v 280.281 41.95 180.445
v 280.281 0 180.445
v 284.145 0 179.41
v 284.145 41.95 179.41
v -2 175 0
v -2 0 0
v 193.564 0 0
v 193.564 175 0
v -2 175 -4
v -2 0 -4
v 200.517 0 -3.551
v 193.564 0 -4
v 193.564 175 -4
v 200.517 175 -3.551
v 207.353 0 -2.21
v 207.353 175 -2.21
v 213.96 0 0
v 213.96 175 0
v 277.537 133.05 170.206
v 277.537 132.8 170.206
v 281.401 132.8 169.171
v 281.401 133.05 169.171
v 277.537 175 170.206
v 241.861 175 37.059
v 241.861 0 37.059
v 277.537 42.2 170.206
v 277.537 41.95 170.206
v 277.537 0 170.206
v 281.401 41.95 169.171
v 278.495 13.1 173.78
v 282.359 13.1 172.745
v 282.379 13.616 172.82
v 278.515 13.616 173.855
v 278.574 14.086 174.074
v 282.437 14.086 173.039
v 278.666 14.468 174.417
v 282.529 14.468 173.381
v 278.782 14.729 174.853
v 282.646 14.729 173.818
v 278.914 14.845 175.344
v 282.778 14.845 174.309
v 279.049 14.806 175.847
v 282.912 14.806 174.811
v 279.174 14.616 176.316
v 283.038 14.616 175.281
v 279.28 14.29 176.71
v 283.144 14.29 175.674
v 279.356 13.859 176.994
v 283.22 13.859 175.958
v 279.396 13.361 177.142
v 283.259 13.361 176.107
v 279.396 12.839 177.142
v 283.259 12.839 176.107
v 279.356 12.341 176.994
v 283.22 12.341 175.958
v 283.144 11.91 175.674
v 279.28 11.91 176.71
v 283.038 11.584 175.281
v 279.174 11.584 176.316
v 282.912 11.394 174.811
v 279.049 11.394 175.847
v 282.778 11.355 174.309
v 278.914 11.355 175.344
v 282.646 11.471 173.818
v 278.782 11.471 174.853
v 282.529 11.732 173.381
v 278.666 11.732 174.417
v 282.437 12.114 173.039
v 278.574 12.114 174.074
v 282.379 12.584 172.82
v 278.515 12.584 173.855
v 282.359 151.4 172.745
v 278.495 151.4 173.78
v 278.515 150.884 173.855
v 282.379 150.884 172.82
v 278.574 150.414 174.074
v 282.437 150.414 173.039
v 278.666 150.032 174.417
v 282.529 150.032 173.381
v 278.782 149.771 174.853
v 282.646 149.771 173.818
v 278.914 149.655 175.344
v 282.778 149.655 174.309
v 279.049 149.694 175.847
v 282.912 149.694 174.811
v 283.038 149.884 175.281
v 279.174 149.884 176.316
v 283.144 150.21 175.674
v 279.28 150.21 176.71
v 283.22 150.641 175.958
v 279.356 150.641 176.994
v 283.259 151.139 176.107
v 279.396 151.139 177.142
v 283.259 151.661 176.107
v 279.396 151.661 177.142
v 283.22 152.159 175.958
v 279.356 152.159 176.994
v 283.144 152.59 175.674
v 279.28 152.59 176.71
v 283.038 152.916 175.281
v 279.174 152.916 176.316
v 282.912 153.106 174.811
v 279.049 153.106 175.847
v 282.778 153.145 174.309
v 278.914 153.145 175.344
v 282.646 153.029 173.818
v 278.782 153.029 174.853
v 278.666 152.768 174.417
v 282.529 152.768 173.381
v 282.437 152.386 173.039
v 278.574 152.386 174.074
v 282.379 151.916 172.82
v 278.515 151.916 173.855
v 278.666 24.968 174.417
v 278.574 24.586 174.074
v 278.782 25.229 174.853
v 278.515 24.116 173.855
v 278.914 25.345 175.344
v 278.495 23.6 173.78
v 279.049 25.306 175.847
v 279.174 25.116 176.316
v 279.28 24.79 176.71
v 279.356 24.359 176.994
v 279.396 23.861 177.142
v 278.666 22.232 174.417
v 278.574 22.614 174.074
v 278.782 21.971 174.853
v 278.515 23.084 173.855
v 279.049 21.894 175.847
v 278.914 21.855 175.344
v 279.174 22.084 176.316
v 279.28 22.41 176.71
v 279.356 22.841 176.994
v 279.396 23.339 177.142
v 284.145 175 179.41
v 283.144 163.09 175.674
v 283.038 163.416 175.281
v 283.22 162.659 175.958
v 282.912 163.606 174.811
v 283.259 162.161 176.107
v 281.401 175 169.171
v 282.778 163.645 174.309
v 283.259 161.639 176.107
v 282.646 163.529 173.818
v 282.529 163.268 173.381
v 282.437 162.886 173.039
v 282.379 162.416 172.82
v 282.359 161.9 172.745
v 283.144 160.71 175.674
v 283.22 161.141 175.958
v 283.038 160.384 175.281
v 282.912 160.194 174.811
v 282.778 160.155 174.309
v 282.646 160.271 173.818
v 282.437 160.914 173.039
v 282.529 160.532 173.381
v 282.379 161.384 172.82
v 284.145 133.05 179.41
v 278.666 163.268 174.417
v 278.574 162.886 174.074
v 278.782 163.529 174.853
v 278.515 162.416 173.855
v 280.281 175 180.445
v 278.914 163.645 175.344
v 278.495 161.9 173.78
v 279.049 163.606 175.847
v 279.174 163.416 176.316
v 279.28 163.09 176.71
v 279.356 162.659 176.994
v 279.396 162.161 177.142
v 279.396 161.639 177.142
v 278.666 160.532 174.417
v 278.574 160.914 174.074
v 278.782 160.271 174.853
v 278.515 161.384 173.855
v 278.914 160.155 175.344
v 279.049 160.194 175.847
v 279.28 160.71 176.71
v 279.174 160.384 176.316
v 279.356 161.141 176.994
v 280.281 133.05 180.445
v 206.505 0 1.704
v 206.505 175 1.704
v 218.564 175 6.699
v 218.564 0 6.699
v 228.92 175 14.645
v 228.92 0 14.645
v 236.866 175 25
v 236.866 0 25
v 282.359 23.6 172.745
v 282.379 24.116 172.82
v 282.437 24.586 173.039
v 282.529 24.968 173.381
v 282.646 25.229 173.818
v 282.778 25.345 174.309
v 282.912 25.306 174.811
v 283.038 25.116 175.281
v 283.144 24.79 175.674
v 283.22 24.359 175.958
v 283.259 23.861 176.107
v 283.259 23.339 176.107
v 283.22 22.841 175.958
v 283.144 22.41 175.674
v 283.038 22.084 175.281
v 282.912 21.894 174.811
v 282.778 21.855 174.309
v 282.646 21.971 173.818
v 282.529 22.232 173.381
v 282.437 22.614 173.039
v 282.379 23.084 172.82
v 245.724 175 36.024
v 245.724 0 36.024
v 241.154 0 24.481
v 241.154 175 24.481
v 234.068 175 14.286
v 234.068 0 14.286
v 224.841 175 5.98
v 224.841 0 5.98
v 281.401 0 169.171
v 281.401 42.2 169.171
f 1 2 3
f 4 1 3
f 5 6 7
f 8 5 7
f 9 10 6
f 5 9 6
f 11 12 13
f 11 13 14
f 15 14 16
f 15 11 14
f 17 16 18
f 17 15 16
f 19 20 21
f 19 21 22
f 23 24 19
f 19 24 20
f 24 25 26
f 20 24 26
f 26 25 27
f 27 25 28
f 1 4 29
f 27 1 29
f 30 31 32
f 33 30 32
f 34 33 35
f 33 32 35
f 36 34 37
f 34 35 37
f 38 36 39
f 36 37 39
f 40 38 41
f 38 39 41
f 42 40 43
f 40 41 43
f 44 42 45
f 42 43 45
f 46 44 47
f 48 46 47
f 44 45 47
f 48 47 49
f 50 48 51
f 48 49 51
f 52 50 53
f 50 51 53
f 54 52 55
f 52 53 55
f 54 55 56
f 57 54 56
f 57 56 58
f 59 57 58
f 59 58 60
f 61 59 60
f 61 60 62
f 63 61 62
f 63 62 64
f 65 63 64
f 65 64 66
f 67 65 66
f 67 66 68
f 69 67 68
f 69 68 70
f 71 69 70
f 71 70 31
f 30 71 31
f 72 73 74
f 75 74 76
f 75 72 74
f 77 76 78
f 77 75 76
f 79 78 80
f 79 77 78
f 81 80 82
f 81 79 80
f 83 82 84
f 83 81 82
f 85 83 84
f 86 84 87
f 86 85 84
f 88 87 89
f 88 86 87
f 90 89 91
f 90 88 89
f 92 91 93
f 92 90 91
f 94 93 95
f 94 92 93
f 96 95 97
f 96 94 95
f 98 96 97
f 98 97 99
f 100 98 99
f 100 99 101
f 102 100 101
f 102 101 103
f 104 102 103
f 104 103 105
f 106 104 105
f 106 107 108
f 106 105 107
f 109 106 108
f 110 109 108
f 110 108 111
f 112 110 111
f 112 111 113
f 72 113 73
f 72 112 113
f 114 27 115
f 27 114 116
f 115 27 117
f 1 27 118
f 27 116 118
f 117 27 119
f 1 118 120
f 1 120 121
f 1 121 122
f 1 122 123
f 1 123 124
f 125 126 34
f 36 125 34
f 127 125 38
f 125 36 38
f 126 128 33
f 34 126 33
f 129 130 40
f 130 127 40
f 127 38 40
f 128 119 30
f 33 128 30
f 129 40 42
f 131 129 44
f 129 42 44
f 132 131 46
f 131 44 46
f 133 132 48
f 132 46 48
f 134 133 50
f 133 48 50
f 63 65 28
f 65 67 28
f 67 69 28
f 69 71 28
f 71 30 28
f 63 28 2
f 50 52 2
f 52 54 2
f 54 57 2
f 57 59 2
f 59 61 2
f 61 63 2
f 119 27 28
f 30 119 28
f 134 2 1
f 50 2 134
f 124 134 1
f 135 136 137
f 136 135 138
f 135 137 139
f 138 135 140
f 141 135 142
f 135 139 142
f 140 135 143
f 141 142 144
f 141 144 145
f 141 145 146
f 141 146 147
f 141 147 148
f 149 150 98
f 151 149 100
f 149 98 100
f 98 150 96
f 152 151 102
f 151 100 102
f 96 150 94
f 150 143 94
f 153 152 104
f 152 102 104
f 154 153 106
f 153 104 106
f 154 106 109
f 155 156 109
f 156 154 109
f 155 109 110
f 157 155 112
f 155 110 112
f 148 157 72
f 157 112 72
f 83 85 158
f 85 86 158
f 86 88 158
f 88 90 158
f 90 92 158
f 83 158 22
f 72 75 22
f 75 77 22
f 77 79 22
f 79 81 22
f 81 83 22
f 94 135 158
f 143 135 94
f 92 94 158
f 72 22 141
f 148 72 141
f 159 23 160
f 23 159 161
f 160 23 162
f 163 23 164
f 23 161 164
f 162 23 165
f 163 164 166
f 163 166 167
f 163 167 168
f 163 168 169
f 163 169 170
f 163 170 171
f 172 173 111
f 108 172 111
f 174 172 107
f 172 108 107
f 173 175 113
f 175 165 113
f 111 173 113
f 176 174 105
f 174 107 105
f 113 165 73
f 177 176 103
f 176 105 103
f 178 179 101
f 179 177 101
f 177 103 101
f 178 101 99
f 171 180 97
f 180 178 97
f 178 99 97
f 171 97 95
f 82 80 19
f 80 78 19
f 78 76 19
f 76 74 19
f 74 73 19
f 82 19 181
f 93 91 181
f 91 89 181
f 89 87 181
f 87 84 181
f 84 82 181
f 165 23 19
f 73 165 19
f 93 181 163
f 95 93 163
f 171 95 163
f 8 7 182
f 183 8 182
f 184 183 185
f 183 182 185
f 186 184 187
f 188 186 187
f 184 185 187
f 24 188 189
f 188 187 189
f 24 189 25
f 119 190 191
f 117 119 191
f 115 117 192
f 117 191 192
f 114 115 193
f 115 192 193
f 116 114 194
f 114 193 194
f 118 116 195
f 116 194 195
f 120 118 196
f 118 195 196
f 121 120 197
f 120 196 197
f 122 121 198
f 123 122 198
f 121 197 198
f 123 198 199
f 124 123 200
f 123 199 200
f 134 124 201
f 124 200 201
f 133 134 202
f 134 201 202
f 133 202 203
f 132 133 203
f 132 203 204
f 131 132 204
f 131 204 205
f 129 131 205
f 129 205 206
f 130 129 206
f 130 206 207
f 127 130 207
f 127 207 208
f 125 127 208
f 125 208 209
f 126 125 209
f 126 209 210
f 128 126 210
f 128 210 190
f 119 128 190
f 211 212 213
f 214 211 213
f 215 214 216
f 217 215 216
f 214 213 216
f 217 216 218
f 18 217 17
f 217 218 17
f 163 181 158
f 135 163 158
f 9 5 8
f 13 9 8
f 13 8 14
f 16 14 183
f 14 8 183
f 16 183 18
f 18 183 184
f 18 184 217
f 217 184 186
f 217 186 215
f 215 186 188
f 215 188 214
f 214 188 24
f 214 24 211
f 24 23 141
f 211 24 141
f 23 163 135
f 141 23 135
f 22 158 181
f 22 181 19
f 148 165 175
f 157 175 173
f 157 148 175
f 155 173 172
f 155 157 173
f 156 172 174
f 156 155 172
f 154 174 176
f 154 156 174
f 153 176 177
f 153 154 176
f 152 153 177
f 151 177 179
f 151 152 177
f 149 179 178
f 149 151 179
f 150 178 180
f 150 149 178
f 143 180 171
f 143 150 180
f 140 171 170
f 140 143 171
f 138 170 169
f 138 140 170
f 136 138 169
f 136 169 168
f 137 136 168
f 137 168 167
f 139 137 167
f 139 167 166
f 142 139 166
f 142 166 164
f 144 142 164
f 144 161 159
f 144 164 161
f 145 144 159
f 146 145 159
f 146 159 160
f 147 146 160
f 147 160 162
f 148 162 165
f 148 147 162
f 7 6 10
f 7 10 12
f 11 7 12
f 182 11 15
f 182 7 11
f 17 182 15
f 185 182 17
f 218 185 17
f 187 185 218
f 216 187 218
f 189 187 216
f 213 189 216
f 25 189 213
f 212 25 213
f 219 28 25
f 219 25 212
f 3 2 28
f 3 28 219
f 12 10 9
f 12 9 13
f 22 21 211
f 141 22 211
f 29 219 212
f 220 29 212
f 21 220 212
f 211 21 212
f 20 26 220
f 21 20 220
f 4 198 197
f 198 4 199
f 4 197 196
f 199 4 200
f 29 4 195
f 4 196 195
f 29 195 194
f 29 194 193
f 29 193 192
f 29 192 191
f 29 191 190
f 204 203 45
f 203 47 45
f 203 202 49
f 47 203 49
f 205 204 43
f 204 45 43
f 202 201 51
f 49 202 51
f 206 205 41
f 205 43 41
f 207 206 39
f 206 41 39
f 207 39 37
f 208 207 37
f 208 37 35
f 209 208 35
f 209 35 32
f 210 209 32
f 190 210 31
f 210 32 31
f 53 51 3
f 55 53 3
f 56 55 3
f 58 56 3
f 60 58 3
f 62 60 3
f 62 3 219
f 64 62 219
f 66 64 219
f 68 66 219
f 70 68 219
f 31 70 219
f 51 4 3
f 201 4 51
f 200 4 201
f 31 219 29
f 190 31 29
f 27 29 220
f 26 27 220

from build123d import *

# Parameters (mm, degrees)
ESBO_O1_W                = 425
ESBO_O1_H                = 175
FLANGE_BASE1_DEPTH       = 4
ESBO_O11_W               = 10.6
ESBO_O11_H               = 90.6
CORTE_EXTRUS_O2_DEPTH    = 155
DOBRA_ESBO_ADA1_DEPTH    = 175
DOBRA_ESBO_ADA1_2_DEPTH  = 175
DOBRA_ESBO_ADA1_3_DEPTH  = 42.2
DOBRA_START              = 132.8
DOBRA_ESBO_ADA1_4_DEPTH  = 42.2
ESBO_O14_R               = 1.75
CORTE_EXTRUS_O3_DEPTH    = 6
ESBO_O15_W               = 10.6
ESBO_O15_H               = 91.1
CORTE_EXTRUS_O4_DEPTH    = 44
ESBO_O16_W               = 2
ESBO_O16_H               = 4
RESSALTO_EXTRUS_O1_DEPTH = 175


# Read off the part's stored shape, not the designer's step: Dobra esboçada1
# Sheet-metal steps are written as plain solids
with BuildPart() as part:
    # Esboço1 → Flange-base1 (new body)
    with BuildSketch(Plane.XY):
        with Locations((212.5, 87.5)):
            Rectangle(ESBO_O1_W, ESBO_O1_H)
    extrude(amount=-FLANGE_BASE1_DEPTH)

    # Esboço11 → Corte-extrusão2 (cut)
    with BuildSketch(Plane(origin=(0, 0, -4), x_dir=(-1, 0, 0), z_dir=(0, 0, -1))):
        Polygon((-425, 175), (-425, 0), (-410.6, 0), (-410.6, 42.2), (-410.6, 132.8), (-410.6, 175), align=None)
        with Locations((-405.3, 87.5)):
            Rectangle(ESBO_O11_W, ESBO_O11_H)
    extrude(amount=-CORTE_EXTRUS_O2_DEPTH, mode=Mode.SUBTRACT)

    # Dobra esboçada1 outline → Dobra esboçada1 (cut)
    with BuildSketch(Plane(origin=(0, 0, 0), x_dir=(1, 0, 0), z_dir=(0, 1, 0))):
        with BuildLine():
            ThreePointArc((193.564342649, 4), (203.956647495, 2.990565198), (213.960420704, 0))
            Line((213.960420704, 0), (410.6, 0))
            Line((410.6, 0), (410.6, 4))
            Line((410.6, 4), (193.564342649, 4))
        make_face()
    extrude(amount=DOBRA_ESBO_ADA1_DEPTH, mode=Mode.SUBTRACT)

    # Dobra esbo_ada1 2 outline → Dobra esbo_ada1 2 (add)
    with BuildSketch(Plane(origin=(0, 0, 0), x_dir=(1, 0, 0), z_dir=(0, 1, 0))):
        with BuildLine():
            Line((277.537342774, -170.206337672), (281.401046079, -169.171061491))
            Line((281.401046079, -169.171061491), (245.724337269, -36.023771564))
            ThreePointArc((245.724337269, -36.023771564), (234.067724606, -14.286192444), (213.960420704, 0))
            Line((213.960420704, 0), (193.564342649, 0))
            ThreePointArc((193.564342649, 0), (224.0024141, -10.332332985), (241.860633964, -37.059047745))
            Line((241.860633964, -37.059047745), (277.537342774, -170.206337672))
        make_face()
    extrude(amount=DOBRA_ESBO_ADA1_2_DEPTH)

    # Dobra esbo_ada1 3 outline → Dobra esbo_ada1 3 (add)
    with BuildSketch(Plane(origin=(0, 0, 0), x_dir=(1, 0, 0), z_dir=(0, 1, 0))):
        Polygon((280.280824652, -180.44515143), (284.144527957, -179.40987525), (281.401046079, -169.171061491), (277.537342774, -170.206337672), align=None)
    extrude(amount=DOBRA_ESBO_ADA1_3_DEPTH)

    # Dobra esbo_ada1 4 outline → Dobra esbo_ada1 4 (add)
    with BuildSketch(Plane(origin=(0, 0, 0), x_dir=(1, 0, 0), z_dir=(0, 1, 0)).offset(DOBRA_START)):
        Polygon((280.280824652, -180.44515143), (284.144527957, -179.40987525), (281.401046079, -169.171061491), (277.537342774, -170.206337672), align=None)
    extrude(amount=DOBRA_ESBO_ADA1_4_DEPTH)

    # Esboço14 → Corte-extrusão3 (cut)
    with BuildSketch(Plane(origin=(220.257984945, 0, -59.017949192), x_dir=(-0.25881904510251796, 0, -0.9659258262890691), z_dir=(0.9659258262890691, 0, -0.25881904510251796))):
        with Locations((-241.688647392, 13.1)):
            Circle(ESBO_O14_R)
        with Locations((-241.688647392, 23.6)):
            Circle(ESBO_O14_R)
    corte_extrus_o3 = extrude(amount=-CORTE_EXTRUS_O3_DEPTH, mode=Mode.SUBTRACT)

    # Espelhar1: Corte-extrusão3 across plane
    add(corte_extrus_o3.mirror(Plane(origin=(0, 87.5, 0), x_dir=(0, 0, 1), z_dir=(0, -1, 0))), mode=Mode.SUBTRACT)

    # Esboço15 → Corte-extrusão4 (cut)
    with BuildSketch(Plane(origin=(220.257984945, 0, -59.017949192), x_dir=(-0.25881904510251796, 0, -0.9659258262890691), z_dir=(0.9659258262890691, 0, -0.25881904510251796))):
        with Locations((-241.538647392, 87.5)):
            Rectangle(ESBO_O15_W, ESBO_O15_H)
    extrude(amount=-CORTE_EXTRUS_O4_DEPTH, mode=Mode.SUBTRACT)

    # Esboço16 → Ressalto-extrusão1 (add)
    with BuildSketch(Plane.XZ):
        with Locations((-1, -2)):
            Rectangle(ESBO_O16_W, ESBO_O16_H)
    extrude(amount=-RESSALTO_EXTRUS_O1_DEPTH)


solid = part.part
